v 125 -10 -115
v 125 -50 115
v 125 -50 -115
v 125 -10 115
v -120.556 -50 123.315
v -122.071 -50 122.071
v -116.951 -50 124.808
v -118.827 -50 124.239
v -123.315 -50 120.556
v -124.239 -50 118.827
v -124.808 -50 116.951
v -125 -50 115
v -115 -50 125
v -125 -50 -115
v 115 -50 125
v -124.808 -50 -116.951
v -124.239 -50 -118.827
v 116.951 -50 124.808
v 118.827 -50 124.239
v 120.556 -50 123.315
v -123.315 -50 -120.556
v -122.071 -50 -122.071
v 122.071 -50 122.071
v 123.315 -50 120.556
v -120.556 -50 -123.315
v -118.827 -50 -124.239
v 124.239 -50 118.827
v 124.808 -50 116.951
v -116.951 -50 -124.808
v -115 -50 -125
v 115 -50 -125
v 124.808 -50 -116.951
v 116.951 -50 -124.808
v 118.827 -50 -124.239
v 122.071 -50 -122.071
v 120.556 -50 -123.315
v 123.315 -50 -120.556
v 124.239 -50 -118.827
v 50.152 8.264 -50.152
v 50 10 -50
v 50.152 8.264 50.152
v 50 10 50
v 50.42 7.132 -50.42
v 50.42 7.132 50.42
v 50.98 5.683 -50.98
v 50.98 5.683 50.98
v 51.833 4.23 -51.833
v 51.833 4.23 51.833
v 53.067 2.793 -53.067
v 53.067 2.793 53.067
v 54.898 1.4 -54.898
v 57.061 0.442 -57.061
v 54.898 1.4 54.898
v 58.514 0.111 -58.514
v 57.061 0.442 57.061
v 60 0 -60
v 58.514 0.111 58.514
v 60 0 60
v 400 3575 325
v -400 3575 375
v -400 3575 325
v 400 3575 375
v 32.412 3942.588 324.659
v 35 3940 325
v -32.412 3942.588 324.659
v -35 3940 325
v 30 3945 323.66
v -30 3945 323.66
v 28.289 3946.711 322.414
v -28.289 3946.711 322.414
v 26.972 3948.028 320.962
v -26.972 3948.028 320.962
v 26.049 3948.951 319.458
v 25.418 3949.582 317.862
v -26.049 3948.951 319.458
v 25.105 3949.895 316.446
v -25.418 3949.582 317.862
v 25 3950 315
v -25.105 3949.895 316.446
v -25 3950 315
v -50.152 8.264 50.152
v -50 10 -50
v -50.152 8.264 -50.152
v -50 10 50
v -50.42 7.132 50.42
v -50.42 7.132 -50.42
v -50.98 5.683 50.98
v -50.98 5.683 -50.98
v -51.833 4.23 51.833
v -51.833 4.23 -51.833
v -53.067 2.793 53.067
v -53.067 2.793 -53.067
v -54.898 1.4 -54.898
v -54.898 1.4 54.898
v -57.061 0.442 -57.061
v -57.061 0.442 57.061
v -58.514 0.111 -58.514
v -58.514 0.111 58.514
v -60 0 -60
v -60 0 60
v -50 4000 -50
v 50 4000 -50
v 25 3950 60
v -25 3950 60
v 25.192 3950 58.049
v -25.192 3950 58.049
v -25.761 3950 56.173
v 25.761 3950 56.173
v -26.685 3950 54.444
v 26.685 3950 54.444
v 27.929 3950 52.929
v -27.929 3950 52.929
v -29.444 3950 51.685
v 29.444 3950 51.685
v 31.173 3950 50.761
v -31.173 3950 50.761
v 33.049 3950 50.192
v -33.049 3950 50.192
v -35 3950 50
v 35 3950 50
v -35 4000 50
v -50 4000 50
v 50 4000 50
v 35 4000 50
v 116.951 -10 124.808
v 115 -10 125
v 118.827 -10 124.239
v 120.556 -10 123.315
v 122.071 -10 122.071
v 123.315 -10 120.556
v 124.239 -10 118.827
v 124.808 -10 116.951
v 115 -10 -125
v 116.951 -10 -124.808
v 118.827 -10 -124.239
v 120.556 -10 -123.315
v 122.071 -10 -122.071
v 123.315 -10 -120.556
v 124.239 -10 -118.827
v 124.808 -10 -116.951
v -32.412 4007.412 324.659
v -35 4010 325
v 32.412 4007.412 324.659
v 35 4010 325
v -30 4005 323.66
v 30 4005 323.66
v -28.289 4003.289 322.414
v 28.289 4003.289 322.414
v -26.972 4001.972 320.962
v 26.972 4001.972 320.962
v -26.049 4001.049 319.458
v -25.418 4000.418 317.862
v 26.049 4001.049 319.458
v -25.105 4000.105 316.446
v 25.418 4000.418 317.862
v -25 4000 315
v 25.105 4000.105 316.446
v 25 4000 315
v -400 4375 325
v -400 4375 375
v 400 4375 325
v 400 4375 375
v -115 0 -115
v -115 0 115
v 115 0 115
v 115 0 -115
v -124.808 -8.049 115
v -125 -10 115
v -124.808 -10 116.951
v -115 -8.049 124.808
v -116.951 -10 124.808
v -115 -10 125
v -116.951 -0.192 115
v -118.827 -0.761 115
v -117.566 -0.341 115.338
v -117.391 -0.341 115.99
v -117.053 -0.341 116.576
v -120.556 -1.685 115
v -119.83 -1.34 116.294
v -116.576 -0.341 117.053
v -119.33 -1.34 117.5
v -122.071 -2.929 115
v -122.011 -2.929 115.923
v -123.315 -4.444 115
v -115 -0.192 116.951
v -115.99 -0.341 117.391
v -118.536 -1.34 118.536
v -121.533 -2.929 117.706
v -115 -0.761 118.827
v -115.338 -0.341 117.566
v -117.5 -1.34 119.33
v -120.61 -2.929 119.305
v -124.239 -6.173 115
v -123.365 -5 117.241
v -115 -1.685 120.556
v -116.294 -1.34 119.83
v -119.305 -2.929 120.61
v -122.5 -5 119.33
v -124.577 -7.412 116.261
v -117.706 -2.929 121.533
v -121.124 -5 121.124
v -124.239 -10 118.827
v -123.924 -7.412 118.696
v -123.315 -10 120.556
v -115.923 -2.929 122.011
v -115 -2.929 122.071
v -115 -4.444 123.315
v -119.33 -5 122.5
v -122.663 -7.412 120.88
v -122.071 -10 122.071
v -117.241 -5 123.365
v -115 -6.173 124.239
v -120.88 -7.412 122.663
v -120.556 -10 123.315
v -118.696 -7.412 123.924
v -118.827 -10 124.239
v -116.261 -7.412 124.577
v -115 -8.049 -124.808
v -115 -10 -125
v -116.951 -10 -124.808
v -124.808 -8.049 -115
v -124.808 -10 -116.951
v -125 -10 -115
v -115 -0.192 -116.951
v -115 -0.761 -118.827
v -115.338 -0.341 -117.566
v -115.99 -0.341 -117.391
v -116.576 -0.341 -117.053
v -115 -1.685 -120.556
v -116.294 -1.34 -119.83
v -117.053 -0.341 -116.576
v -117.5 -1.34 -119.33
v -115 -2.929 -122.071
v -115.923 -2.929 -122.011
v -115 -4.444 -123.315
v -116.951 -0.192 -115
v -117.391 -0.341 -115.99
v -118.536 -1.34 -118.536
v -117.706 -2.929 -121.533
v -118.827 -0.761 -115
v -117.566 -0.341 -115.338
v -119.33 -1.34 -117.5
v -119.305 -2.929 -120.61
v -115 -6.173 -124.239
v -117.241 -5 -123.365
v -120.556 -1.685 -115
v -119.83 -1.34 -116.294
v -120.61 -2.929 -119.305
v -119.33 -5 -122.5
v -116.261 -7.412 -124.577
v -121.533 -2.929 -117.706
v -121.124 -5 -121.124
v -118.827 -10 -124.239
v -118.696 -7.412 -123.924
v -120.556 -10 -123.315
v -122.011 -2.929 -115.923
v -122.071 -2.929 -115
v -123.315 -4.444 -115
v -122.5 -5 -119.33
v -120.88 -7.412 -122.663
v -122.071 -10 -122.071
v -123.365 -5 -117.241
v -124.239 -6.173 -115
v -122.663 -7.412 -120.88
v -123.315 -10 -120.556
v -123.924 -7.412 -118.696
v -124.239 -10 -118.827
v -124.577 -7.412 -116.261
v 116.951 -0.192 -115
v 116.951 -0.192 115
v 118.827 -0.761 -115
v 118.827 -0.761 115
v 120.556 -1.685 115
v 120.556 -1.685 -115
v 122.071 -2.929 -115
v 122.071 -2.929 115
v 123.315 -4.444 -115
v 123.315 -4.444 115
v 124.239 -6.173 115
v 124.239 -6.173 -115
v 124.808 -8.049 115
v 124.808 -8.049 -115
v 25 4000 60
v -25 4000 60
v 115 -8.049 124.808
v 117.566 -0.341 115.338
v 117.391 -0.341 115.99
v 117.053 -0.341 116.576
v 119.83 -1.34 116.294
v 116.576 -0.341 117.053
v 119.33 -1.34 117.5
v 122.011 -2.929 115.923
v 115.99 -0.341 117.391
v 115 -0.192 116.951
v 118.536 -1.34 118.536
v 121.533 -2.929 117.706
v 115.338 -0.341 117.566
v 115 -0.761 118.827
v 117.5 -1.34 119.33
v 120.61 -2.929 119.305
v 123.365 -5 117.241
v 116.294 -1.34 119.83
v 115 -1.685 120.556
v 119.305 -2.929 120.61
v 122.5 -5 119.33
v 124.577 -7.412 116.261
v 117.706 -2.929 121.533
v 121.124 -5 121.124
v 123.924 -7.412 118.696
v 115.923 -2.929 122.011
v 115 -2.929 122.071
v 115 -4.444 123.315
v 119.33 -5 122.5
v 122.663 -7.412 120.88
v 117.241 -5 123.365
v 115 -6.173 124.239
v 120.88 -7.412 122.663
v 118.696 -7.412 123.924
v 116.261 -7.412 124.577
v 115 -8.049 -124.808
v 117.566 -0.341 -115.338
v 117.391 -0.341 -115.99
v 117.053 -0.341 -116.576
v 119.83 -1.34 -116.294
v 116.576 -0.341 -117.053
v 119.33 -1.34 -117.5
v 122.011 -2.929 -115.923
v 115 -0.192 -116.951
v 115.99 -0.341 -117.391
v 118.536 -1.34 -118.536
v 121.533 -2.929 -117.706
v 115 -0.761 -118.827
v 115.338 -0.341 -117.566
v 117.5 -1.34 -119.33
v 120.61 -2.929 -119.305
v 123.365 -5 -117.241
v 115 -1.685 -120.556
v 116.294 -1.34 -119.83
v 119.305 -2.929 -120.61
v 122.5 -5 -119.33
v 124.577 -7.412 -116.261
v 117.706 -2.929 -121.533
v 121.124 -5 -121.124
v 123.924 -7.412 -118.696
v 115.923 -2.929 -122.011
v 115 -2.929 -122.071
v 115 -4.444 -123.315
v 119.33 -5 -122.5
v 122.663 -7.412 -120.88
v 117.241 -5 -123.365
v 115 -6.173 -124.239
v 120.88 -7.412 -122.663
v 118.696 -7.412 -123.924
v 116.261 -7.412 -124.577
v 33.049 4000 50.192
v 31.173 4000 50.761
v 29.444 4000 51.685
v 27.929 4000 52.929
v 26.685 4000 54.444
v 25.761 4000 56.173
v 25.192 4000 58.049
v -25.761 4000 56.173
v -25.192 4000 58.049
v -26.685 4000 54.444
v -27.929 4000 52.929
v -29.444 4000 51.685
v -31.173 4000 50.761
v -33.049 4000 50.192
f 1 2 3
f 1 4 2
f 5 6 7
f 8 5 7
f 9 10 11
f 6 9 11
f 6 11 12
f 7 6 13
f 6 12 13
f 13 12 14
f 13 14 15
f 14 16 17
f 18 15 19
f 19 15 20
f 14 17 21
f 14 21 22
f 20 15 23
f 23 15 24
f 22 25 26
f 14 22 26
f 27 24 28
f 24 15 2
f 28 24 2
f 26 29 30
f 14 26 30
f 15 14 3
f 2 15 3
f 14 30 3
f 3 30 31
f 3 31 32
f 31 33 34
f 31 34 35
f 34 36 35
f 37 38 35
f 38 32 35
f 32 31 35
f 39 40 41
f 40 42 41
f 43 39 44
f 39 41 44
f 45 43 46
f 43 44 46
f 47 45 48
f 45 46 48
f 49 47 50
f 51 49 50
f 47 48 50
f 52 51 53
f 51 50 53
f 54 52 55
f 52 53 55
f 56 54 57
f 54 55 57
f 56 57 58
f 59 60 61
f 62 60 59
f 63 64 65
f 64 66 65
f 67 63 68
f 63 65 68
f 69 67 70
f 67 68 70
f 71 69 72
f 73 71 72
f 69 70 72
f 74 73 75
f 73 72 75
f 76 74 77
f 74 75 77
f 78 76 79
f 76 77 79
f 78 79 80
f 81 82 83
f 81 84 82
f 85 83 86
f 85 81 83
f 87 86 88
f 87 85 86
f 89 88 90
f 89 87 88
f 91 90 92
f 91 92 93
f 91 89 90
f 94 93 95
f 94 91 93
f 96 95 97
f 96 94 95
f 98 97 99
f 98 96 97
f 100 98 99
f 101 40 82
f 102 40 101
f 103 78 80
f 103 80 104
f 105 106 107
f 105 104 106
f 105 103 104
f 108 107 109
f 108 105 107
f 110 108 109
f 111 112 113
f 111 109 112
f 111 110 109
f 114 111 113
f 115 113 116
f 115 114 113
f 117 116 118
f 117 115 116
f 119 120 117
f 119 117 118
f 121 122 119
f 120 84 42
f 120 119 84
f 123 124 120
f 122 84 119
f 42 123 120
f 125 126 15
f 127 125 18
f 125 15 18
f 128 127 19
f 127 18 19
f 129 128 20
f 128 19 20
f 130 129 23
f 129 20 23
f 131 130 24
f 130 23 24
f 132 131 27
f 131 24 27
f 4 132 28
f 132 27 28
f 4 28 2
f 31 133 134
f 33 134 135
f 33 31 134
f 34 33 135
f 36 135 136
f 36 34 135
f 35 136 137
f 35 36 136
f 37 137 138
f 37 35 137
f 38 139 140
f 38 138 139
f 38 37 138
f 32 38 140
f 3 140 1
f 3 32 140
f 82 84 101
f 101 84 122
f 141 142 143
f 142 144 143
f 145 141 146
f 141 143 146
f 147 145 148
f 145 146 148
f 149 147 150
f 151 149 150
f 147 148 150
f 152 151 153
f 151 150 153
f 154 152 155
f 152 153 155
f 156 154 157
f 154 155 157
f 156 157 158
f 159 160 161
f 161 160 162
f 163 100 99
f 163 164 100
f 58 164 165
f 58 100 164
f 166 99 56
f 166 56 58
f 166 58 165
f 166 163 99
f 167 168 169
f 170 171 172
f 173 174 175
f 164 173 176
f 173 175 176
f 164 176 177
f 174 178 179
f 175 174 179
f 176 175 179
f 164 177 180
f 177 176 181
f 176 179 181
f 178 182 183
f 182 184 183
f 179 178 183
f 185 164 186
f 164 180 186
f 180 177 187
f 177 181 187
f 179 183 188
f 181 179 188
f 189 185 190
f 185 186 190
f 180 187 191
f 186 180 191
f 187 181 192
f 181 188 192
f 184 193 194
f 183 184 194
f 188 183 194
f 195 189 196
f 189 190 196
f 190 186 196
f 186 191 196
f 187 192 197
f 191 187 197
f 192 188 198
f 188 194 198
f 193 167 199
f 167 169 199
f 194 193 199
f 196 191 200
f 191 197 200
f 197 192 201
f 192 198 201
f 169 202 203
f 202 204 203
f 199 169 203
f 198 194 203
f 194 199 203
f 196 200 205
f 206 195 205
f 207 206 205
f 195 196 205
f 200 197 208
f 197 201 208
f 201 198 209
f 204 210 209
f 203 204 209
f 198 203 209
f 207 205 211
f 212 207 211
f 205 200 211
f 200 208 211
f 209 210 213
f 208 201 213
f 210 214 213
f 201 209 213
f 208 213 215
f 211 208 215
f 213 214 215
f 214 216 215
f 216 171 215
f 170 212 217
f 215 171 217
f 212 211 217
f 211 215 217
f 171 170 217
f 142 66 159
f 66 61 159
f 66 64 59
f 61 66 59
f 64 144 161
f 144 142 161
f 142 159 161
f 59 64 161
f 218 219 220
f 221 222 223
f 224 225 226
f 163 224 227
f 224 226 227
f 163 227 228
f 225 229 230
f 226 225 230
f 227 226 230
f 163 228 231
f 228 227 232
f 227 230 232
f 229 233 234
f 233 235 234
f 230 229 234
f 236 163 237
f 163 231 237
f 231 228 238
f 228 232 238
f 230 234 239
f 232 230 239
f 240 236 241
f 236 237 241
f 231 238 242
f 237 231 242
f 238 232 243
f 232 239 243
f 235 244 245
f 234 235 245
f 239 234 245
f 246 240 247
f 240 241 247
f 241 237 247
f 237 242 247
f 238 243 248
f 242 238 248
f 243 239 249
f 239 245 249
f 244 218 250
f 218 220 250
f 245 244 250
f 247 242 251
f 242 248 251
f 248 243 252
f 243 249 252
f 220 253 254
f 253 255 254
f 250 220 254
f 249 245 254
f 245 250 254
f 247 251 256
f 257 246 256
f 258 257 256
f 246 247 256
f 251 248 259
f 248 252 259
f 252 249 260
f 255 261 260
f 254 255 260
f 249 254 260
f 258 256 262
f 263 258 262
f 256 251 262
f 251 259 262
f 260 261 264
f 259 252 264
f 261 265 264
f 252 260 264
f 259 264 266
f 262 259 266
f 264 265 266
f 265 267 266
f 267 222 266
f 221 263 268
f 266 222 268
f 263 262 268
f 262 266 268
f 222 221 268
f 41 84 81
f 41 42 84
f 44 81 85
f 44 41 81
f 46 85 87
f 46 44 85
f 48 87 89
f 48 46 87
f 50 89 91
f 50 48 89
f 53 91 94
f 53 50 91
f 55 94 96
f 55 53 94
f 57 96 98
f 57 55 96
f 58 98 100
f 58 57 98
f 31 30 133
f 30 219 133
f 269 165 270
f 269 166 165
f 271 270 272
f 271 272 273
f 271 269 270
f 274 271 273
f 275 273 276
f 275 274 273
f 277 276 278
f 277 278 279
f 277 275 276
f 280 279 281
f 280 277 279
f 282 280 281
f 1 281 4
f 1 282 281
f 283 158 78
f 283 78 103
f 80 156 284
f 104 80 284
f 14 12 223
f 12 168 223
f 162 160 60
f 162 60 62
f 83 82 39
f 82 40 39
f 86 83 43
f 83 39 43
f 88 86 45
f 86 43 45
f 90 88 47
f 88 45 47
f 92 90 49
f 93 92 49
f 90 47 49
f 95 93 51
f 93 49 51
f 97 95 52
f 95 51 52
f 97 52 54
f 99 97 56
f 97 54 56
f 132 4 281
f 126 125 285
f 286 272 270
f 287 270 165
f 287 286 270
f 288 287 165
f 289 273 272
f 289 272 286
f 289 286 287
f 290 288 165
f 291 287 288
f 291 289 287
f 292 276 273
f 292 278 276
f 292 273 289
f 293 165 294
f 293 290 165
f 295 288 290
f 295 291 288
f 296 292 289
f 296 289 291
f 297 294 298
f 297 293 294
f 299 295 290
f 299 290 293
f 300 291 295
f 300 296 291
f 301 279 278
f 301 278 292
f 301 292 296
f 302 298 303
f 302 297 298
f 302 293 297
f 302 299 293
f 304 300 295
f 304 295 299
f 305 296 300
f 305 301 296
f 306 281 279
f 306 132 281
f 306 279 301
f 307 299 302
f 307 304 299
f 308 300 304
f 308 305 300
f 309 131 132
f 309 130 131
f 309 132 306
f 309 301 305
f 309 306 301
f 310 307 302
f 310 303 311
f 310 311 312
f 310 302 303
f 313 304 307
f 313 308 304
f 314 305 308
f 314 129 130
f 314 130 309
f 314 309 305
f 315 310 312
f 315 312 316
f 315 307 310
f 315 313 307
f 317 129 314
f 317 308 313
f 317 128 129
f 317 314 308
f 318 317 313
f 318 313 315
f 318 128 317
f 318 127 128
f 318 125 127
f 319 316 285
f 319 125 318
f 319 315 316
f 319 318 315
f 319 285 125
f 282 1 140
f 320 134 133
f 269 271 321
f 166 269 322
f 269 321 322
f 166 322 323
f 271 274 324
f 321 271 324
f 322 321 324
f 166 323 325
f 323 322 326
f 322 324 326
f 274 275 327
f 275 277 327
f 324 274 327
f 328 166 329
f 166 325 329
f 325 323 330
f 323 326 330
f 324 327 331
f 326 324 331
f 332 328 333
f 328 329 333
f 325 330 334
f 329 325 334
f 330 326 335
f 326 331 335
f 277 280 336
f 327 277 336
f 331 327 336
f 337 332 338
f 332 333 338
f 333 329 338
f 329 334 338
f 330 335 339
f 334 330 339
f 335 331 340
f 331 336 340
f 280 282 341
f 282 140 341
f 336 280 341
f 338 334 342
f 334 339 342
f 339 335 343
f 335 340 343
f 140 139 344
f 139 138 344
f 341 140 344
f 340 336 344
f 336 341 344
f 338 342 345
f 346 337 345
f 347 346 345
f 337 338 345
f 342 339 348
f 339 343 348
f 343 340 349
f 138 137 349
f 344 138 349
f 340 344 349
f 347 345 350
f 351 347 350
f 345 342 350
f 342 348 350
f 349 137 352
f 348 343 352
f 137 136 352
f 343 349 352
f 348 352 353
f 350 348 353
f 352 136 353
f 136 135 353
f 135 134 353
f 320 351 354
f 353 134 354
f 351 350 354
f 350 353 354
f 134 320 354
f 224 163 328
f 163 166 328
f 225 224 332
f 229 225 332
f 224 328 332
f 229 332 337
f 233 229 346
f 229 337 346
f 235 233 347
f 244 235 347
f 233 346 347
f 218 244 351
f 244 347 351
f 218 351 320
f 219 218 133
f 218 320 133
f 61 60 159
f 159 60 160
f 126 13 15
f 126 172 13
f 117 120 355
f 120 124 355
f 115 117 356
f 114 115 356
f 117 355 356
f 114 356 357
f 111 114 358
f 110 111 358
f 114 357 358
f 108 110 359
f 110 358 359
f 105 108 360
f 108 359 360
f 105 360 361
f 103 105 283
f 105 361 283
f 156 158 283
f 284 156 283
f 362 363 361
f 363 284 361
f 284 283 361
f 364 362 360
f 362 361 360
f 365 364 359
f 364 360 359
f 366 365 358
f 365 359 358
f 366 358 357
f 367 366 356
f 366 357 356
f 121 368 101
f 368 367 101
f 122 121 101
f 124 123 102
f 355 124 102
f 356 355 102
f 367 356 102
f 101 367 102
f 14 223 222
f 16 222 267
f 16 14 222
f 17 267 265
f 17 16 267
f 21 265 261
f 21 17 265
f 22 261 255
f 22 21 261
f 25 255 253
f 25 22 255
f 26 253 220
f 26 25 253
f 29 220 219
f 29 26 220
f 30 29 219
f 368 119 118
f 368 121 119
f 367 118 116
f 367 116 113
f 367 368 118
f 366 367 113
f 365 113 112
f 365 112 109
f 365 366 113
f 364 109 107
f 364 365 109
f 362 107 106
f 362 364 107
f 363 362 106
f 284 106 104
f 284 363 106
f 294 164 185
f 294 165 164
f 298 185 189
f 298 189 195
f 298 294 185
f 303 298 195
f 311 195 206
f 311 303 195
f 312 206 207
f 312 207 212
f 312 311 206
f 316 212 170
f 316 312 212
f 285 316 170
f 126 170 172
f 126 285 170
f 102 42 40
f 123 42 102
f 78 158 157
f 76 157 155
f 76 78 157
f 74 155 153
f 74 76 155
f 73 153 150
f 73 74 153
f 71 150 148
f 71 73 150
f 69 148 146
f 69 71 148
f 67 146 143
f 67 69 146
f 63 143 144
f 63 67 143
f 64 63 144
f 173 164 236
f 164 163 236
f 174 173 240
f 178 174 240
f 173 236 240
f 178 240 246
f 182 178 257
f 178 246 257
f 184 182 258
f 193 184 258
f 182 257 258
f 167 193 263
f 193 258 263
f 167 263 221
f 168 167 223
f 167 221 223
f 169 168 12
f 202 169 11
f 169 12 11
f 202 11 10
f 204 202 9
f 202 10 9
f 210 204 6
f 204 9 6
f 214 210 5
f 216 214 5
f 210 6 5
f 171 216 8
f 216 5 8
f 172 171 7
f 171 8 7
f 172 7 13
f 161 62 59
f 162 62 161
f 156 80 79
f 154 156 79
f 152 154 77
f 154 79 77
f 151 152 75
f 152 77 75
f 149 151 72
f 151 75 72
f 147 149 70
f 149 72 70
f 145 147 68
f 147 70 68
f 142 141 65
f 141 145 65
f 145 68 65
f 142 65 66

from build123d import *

# Parameters (mm, degrees)
SKETCH1_W           = 100
SKETCH1_H           = 4000
BOSS_EXTRUDE1_DEPTH = 50
SKETCH2_W           = 250
SKETCH2_H           = 250
BOSS_EXTRUDE2_DEPTH = 50
SKETCH3_W           = 400
SKETCH3_H           = 50
BOSS_EXTRUDE3_DEPTH = 25
SKETCH4_W           = 800
SKETCH4_H           = 800
BOSS_EXTRUDE4_DEPTH = 25
FILLET1_R           = 10
FILLET3_R           = 10
FILLET4_R           = 10


with BuildPart() as part:
    # Sketch1 → Boss-Extrude1 (new, symmetric)
    with BuildSketch(Plane.XY):
        with Locations((0, 2000)):
            Rectangle(SKETCH1_W, SKETCH1_H)
    extrude(amount=BOSS_EXTRUDE1_DEPTH, both=True)

    # Sketch2 → Boss-Extrude2 (add)
    with BuildSketch(Plane(origin=(0, 0, 0), x_dir=(1, 0, 0), z_dir=(0, 1, 0))):
        Rectangle(SKETCH2_W, SKETCH2_H)
    extrude(amount=-BOSS_EXTRUDE2_DEPTH)

    # Sketch3 → Boss-Extrude3 (add, symmetric)
    with BuildSketch(Plane(origin=(0, 0, 0), x_dir=(0, 0, -1), z_dir=(1, 0, 0))):
        with Locations((-150, 3975)):
            Rectangle(SKETCH3_W, SKETCH3_H)
    extrude(amount=BOSS_EXTRUDE3_DEPTH, both=True)

    # Sketch4 → Boss-Extrude4 (add, symmetric)
    with BuildSketch(Plane.XY.offset(350)):
        with Locations((0, 3975)):
            Rectangle(SKETCH4_W, SKETCH4_H)
    extrude(amount=BOSS_EXTRUDE4_DEPTH, both=True)

    # Fillet1
    fillet1_edges = [part.edges().sort_by_distance(p)[0] for p in [
        (125, -25, -125),
        (125, -25, 125),
        (-125, -25, 125),
        (-125, -25, -125),
        (125, 0, 0),
        (0, 0, -125),
        (-125, 0, 0),
        (0, 0, 125),
        (0, 0, -50),
        (50, 0, 0),
        (-50, 0, 0),
        (0, 0, 50),
    ]]
    fillet(fillet1_edges, radius=FILLET1_R)

    # Fillet3
    fillet3_edges = [part.edges().sort_by_distance(p)[0] for p in [
        (25, 3975, 50),
        (-25, 3975, 50),
        (25, 3975, 325),
        (-25, 3975, 325),
    ]]
    fillet(fillet3_edges, radius=FILLET3_R)

    # Fillet4
    fillet4_edges = [part.edges().sort_by_distance(p)[0] for p in [
        (0, 3950, 325),
        (0, 4000, 325),
    ]]
    fillet(fillet4_edges, radius=FILLET4_R)


solid = part.part
